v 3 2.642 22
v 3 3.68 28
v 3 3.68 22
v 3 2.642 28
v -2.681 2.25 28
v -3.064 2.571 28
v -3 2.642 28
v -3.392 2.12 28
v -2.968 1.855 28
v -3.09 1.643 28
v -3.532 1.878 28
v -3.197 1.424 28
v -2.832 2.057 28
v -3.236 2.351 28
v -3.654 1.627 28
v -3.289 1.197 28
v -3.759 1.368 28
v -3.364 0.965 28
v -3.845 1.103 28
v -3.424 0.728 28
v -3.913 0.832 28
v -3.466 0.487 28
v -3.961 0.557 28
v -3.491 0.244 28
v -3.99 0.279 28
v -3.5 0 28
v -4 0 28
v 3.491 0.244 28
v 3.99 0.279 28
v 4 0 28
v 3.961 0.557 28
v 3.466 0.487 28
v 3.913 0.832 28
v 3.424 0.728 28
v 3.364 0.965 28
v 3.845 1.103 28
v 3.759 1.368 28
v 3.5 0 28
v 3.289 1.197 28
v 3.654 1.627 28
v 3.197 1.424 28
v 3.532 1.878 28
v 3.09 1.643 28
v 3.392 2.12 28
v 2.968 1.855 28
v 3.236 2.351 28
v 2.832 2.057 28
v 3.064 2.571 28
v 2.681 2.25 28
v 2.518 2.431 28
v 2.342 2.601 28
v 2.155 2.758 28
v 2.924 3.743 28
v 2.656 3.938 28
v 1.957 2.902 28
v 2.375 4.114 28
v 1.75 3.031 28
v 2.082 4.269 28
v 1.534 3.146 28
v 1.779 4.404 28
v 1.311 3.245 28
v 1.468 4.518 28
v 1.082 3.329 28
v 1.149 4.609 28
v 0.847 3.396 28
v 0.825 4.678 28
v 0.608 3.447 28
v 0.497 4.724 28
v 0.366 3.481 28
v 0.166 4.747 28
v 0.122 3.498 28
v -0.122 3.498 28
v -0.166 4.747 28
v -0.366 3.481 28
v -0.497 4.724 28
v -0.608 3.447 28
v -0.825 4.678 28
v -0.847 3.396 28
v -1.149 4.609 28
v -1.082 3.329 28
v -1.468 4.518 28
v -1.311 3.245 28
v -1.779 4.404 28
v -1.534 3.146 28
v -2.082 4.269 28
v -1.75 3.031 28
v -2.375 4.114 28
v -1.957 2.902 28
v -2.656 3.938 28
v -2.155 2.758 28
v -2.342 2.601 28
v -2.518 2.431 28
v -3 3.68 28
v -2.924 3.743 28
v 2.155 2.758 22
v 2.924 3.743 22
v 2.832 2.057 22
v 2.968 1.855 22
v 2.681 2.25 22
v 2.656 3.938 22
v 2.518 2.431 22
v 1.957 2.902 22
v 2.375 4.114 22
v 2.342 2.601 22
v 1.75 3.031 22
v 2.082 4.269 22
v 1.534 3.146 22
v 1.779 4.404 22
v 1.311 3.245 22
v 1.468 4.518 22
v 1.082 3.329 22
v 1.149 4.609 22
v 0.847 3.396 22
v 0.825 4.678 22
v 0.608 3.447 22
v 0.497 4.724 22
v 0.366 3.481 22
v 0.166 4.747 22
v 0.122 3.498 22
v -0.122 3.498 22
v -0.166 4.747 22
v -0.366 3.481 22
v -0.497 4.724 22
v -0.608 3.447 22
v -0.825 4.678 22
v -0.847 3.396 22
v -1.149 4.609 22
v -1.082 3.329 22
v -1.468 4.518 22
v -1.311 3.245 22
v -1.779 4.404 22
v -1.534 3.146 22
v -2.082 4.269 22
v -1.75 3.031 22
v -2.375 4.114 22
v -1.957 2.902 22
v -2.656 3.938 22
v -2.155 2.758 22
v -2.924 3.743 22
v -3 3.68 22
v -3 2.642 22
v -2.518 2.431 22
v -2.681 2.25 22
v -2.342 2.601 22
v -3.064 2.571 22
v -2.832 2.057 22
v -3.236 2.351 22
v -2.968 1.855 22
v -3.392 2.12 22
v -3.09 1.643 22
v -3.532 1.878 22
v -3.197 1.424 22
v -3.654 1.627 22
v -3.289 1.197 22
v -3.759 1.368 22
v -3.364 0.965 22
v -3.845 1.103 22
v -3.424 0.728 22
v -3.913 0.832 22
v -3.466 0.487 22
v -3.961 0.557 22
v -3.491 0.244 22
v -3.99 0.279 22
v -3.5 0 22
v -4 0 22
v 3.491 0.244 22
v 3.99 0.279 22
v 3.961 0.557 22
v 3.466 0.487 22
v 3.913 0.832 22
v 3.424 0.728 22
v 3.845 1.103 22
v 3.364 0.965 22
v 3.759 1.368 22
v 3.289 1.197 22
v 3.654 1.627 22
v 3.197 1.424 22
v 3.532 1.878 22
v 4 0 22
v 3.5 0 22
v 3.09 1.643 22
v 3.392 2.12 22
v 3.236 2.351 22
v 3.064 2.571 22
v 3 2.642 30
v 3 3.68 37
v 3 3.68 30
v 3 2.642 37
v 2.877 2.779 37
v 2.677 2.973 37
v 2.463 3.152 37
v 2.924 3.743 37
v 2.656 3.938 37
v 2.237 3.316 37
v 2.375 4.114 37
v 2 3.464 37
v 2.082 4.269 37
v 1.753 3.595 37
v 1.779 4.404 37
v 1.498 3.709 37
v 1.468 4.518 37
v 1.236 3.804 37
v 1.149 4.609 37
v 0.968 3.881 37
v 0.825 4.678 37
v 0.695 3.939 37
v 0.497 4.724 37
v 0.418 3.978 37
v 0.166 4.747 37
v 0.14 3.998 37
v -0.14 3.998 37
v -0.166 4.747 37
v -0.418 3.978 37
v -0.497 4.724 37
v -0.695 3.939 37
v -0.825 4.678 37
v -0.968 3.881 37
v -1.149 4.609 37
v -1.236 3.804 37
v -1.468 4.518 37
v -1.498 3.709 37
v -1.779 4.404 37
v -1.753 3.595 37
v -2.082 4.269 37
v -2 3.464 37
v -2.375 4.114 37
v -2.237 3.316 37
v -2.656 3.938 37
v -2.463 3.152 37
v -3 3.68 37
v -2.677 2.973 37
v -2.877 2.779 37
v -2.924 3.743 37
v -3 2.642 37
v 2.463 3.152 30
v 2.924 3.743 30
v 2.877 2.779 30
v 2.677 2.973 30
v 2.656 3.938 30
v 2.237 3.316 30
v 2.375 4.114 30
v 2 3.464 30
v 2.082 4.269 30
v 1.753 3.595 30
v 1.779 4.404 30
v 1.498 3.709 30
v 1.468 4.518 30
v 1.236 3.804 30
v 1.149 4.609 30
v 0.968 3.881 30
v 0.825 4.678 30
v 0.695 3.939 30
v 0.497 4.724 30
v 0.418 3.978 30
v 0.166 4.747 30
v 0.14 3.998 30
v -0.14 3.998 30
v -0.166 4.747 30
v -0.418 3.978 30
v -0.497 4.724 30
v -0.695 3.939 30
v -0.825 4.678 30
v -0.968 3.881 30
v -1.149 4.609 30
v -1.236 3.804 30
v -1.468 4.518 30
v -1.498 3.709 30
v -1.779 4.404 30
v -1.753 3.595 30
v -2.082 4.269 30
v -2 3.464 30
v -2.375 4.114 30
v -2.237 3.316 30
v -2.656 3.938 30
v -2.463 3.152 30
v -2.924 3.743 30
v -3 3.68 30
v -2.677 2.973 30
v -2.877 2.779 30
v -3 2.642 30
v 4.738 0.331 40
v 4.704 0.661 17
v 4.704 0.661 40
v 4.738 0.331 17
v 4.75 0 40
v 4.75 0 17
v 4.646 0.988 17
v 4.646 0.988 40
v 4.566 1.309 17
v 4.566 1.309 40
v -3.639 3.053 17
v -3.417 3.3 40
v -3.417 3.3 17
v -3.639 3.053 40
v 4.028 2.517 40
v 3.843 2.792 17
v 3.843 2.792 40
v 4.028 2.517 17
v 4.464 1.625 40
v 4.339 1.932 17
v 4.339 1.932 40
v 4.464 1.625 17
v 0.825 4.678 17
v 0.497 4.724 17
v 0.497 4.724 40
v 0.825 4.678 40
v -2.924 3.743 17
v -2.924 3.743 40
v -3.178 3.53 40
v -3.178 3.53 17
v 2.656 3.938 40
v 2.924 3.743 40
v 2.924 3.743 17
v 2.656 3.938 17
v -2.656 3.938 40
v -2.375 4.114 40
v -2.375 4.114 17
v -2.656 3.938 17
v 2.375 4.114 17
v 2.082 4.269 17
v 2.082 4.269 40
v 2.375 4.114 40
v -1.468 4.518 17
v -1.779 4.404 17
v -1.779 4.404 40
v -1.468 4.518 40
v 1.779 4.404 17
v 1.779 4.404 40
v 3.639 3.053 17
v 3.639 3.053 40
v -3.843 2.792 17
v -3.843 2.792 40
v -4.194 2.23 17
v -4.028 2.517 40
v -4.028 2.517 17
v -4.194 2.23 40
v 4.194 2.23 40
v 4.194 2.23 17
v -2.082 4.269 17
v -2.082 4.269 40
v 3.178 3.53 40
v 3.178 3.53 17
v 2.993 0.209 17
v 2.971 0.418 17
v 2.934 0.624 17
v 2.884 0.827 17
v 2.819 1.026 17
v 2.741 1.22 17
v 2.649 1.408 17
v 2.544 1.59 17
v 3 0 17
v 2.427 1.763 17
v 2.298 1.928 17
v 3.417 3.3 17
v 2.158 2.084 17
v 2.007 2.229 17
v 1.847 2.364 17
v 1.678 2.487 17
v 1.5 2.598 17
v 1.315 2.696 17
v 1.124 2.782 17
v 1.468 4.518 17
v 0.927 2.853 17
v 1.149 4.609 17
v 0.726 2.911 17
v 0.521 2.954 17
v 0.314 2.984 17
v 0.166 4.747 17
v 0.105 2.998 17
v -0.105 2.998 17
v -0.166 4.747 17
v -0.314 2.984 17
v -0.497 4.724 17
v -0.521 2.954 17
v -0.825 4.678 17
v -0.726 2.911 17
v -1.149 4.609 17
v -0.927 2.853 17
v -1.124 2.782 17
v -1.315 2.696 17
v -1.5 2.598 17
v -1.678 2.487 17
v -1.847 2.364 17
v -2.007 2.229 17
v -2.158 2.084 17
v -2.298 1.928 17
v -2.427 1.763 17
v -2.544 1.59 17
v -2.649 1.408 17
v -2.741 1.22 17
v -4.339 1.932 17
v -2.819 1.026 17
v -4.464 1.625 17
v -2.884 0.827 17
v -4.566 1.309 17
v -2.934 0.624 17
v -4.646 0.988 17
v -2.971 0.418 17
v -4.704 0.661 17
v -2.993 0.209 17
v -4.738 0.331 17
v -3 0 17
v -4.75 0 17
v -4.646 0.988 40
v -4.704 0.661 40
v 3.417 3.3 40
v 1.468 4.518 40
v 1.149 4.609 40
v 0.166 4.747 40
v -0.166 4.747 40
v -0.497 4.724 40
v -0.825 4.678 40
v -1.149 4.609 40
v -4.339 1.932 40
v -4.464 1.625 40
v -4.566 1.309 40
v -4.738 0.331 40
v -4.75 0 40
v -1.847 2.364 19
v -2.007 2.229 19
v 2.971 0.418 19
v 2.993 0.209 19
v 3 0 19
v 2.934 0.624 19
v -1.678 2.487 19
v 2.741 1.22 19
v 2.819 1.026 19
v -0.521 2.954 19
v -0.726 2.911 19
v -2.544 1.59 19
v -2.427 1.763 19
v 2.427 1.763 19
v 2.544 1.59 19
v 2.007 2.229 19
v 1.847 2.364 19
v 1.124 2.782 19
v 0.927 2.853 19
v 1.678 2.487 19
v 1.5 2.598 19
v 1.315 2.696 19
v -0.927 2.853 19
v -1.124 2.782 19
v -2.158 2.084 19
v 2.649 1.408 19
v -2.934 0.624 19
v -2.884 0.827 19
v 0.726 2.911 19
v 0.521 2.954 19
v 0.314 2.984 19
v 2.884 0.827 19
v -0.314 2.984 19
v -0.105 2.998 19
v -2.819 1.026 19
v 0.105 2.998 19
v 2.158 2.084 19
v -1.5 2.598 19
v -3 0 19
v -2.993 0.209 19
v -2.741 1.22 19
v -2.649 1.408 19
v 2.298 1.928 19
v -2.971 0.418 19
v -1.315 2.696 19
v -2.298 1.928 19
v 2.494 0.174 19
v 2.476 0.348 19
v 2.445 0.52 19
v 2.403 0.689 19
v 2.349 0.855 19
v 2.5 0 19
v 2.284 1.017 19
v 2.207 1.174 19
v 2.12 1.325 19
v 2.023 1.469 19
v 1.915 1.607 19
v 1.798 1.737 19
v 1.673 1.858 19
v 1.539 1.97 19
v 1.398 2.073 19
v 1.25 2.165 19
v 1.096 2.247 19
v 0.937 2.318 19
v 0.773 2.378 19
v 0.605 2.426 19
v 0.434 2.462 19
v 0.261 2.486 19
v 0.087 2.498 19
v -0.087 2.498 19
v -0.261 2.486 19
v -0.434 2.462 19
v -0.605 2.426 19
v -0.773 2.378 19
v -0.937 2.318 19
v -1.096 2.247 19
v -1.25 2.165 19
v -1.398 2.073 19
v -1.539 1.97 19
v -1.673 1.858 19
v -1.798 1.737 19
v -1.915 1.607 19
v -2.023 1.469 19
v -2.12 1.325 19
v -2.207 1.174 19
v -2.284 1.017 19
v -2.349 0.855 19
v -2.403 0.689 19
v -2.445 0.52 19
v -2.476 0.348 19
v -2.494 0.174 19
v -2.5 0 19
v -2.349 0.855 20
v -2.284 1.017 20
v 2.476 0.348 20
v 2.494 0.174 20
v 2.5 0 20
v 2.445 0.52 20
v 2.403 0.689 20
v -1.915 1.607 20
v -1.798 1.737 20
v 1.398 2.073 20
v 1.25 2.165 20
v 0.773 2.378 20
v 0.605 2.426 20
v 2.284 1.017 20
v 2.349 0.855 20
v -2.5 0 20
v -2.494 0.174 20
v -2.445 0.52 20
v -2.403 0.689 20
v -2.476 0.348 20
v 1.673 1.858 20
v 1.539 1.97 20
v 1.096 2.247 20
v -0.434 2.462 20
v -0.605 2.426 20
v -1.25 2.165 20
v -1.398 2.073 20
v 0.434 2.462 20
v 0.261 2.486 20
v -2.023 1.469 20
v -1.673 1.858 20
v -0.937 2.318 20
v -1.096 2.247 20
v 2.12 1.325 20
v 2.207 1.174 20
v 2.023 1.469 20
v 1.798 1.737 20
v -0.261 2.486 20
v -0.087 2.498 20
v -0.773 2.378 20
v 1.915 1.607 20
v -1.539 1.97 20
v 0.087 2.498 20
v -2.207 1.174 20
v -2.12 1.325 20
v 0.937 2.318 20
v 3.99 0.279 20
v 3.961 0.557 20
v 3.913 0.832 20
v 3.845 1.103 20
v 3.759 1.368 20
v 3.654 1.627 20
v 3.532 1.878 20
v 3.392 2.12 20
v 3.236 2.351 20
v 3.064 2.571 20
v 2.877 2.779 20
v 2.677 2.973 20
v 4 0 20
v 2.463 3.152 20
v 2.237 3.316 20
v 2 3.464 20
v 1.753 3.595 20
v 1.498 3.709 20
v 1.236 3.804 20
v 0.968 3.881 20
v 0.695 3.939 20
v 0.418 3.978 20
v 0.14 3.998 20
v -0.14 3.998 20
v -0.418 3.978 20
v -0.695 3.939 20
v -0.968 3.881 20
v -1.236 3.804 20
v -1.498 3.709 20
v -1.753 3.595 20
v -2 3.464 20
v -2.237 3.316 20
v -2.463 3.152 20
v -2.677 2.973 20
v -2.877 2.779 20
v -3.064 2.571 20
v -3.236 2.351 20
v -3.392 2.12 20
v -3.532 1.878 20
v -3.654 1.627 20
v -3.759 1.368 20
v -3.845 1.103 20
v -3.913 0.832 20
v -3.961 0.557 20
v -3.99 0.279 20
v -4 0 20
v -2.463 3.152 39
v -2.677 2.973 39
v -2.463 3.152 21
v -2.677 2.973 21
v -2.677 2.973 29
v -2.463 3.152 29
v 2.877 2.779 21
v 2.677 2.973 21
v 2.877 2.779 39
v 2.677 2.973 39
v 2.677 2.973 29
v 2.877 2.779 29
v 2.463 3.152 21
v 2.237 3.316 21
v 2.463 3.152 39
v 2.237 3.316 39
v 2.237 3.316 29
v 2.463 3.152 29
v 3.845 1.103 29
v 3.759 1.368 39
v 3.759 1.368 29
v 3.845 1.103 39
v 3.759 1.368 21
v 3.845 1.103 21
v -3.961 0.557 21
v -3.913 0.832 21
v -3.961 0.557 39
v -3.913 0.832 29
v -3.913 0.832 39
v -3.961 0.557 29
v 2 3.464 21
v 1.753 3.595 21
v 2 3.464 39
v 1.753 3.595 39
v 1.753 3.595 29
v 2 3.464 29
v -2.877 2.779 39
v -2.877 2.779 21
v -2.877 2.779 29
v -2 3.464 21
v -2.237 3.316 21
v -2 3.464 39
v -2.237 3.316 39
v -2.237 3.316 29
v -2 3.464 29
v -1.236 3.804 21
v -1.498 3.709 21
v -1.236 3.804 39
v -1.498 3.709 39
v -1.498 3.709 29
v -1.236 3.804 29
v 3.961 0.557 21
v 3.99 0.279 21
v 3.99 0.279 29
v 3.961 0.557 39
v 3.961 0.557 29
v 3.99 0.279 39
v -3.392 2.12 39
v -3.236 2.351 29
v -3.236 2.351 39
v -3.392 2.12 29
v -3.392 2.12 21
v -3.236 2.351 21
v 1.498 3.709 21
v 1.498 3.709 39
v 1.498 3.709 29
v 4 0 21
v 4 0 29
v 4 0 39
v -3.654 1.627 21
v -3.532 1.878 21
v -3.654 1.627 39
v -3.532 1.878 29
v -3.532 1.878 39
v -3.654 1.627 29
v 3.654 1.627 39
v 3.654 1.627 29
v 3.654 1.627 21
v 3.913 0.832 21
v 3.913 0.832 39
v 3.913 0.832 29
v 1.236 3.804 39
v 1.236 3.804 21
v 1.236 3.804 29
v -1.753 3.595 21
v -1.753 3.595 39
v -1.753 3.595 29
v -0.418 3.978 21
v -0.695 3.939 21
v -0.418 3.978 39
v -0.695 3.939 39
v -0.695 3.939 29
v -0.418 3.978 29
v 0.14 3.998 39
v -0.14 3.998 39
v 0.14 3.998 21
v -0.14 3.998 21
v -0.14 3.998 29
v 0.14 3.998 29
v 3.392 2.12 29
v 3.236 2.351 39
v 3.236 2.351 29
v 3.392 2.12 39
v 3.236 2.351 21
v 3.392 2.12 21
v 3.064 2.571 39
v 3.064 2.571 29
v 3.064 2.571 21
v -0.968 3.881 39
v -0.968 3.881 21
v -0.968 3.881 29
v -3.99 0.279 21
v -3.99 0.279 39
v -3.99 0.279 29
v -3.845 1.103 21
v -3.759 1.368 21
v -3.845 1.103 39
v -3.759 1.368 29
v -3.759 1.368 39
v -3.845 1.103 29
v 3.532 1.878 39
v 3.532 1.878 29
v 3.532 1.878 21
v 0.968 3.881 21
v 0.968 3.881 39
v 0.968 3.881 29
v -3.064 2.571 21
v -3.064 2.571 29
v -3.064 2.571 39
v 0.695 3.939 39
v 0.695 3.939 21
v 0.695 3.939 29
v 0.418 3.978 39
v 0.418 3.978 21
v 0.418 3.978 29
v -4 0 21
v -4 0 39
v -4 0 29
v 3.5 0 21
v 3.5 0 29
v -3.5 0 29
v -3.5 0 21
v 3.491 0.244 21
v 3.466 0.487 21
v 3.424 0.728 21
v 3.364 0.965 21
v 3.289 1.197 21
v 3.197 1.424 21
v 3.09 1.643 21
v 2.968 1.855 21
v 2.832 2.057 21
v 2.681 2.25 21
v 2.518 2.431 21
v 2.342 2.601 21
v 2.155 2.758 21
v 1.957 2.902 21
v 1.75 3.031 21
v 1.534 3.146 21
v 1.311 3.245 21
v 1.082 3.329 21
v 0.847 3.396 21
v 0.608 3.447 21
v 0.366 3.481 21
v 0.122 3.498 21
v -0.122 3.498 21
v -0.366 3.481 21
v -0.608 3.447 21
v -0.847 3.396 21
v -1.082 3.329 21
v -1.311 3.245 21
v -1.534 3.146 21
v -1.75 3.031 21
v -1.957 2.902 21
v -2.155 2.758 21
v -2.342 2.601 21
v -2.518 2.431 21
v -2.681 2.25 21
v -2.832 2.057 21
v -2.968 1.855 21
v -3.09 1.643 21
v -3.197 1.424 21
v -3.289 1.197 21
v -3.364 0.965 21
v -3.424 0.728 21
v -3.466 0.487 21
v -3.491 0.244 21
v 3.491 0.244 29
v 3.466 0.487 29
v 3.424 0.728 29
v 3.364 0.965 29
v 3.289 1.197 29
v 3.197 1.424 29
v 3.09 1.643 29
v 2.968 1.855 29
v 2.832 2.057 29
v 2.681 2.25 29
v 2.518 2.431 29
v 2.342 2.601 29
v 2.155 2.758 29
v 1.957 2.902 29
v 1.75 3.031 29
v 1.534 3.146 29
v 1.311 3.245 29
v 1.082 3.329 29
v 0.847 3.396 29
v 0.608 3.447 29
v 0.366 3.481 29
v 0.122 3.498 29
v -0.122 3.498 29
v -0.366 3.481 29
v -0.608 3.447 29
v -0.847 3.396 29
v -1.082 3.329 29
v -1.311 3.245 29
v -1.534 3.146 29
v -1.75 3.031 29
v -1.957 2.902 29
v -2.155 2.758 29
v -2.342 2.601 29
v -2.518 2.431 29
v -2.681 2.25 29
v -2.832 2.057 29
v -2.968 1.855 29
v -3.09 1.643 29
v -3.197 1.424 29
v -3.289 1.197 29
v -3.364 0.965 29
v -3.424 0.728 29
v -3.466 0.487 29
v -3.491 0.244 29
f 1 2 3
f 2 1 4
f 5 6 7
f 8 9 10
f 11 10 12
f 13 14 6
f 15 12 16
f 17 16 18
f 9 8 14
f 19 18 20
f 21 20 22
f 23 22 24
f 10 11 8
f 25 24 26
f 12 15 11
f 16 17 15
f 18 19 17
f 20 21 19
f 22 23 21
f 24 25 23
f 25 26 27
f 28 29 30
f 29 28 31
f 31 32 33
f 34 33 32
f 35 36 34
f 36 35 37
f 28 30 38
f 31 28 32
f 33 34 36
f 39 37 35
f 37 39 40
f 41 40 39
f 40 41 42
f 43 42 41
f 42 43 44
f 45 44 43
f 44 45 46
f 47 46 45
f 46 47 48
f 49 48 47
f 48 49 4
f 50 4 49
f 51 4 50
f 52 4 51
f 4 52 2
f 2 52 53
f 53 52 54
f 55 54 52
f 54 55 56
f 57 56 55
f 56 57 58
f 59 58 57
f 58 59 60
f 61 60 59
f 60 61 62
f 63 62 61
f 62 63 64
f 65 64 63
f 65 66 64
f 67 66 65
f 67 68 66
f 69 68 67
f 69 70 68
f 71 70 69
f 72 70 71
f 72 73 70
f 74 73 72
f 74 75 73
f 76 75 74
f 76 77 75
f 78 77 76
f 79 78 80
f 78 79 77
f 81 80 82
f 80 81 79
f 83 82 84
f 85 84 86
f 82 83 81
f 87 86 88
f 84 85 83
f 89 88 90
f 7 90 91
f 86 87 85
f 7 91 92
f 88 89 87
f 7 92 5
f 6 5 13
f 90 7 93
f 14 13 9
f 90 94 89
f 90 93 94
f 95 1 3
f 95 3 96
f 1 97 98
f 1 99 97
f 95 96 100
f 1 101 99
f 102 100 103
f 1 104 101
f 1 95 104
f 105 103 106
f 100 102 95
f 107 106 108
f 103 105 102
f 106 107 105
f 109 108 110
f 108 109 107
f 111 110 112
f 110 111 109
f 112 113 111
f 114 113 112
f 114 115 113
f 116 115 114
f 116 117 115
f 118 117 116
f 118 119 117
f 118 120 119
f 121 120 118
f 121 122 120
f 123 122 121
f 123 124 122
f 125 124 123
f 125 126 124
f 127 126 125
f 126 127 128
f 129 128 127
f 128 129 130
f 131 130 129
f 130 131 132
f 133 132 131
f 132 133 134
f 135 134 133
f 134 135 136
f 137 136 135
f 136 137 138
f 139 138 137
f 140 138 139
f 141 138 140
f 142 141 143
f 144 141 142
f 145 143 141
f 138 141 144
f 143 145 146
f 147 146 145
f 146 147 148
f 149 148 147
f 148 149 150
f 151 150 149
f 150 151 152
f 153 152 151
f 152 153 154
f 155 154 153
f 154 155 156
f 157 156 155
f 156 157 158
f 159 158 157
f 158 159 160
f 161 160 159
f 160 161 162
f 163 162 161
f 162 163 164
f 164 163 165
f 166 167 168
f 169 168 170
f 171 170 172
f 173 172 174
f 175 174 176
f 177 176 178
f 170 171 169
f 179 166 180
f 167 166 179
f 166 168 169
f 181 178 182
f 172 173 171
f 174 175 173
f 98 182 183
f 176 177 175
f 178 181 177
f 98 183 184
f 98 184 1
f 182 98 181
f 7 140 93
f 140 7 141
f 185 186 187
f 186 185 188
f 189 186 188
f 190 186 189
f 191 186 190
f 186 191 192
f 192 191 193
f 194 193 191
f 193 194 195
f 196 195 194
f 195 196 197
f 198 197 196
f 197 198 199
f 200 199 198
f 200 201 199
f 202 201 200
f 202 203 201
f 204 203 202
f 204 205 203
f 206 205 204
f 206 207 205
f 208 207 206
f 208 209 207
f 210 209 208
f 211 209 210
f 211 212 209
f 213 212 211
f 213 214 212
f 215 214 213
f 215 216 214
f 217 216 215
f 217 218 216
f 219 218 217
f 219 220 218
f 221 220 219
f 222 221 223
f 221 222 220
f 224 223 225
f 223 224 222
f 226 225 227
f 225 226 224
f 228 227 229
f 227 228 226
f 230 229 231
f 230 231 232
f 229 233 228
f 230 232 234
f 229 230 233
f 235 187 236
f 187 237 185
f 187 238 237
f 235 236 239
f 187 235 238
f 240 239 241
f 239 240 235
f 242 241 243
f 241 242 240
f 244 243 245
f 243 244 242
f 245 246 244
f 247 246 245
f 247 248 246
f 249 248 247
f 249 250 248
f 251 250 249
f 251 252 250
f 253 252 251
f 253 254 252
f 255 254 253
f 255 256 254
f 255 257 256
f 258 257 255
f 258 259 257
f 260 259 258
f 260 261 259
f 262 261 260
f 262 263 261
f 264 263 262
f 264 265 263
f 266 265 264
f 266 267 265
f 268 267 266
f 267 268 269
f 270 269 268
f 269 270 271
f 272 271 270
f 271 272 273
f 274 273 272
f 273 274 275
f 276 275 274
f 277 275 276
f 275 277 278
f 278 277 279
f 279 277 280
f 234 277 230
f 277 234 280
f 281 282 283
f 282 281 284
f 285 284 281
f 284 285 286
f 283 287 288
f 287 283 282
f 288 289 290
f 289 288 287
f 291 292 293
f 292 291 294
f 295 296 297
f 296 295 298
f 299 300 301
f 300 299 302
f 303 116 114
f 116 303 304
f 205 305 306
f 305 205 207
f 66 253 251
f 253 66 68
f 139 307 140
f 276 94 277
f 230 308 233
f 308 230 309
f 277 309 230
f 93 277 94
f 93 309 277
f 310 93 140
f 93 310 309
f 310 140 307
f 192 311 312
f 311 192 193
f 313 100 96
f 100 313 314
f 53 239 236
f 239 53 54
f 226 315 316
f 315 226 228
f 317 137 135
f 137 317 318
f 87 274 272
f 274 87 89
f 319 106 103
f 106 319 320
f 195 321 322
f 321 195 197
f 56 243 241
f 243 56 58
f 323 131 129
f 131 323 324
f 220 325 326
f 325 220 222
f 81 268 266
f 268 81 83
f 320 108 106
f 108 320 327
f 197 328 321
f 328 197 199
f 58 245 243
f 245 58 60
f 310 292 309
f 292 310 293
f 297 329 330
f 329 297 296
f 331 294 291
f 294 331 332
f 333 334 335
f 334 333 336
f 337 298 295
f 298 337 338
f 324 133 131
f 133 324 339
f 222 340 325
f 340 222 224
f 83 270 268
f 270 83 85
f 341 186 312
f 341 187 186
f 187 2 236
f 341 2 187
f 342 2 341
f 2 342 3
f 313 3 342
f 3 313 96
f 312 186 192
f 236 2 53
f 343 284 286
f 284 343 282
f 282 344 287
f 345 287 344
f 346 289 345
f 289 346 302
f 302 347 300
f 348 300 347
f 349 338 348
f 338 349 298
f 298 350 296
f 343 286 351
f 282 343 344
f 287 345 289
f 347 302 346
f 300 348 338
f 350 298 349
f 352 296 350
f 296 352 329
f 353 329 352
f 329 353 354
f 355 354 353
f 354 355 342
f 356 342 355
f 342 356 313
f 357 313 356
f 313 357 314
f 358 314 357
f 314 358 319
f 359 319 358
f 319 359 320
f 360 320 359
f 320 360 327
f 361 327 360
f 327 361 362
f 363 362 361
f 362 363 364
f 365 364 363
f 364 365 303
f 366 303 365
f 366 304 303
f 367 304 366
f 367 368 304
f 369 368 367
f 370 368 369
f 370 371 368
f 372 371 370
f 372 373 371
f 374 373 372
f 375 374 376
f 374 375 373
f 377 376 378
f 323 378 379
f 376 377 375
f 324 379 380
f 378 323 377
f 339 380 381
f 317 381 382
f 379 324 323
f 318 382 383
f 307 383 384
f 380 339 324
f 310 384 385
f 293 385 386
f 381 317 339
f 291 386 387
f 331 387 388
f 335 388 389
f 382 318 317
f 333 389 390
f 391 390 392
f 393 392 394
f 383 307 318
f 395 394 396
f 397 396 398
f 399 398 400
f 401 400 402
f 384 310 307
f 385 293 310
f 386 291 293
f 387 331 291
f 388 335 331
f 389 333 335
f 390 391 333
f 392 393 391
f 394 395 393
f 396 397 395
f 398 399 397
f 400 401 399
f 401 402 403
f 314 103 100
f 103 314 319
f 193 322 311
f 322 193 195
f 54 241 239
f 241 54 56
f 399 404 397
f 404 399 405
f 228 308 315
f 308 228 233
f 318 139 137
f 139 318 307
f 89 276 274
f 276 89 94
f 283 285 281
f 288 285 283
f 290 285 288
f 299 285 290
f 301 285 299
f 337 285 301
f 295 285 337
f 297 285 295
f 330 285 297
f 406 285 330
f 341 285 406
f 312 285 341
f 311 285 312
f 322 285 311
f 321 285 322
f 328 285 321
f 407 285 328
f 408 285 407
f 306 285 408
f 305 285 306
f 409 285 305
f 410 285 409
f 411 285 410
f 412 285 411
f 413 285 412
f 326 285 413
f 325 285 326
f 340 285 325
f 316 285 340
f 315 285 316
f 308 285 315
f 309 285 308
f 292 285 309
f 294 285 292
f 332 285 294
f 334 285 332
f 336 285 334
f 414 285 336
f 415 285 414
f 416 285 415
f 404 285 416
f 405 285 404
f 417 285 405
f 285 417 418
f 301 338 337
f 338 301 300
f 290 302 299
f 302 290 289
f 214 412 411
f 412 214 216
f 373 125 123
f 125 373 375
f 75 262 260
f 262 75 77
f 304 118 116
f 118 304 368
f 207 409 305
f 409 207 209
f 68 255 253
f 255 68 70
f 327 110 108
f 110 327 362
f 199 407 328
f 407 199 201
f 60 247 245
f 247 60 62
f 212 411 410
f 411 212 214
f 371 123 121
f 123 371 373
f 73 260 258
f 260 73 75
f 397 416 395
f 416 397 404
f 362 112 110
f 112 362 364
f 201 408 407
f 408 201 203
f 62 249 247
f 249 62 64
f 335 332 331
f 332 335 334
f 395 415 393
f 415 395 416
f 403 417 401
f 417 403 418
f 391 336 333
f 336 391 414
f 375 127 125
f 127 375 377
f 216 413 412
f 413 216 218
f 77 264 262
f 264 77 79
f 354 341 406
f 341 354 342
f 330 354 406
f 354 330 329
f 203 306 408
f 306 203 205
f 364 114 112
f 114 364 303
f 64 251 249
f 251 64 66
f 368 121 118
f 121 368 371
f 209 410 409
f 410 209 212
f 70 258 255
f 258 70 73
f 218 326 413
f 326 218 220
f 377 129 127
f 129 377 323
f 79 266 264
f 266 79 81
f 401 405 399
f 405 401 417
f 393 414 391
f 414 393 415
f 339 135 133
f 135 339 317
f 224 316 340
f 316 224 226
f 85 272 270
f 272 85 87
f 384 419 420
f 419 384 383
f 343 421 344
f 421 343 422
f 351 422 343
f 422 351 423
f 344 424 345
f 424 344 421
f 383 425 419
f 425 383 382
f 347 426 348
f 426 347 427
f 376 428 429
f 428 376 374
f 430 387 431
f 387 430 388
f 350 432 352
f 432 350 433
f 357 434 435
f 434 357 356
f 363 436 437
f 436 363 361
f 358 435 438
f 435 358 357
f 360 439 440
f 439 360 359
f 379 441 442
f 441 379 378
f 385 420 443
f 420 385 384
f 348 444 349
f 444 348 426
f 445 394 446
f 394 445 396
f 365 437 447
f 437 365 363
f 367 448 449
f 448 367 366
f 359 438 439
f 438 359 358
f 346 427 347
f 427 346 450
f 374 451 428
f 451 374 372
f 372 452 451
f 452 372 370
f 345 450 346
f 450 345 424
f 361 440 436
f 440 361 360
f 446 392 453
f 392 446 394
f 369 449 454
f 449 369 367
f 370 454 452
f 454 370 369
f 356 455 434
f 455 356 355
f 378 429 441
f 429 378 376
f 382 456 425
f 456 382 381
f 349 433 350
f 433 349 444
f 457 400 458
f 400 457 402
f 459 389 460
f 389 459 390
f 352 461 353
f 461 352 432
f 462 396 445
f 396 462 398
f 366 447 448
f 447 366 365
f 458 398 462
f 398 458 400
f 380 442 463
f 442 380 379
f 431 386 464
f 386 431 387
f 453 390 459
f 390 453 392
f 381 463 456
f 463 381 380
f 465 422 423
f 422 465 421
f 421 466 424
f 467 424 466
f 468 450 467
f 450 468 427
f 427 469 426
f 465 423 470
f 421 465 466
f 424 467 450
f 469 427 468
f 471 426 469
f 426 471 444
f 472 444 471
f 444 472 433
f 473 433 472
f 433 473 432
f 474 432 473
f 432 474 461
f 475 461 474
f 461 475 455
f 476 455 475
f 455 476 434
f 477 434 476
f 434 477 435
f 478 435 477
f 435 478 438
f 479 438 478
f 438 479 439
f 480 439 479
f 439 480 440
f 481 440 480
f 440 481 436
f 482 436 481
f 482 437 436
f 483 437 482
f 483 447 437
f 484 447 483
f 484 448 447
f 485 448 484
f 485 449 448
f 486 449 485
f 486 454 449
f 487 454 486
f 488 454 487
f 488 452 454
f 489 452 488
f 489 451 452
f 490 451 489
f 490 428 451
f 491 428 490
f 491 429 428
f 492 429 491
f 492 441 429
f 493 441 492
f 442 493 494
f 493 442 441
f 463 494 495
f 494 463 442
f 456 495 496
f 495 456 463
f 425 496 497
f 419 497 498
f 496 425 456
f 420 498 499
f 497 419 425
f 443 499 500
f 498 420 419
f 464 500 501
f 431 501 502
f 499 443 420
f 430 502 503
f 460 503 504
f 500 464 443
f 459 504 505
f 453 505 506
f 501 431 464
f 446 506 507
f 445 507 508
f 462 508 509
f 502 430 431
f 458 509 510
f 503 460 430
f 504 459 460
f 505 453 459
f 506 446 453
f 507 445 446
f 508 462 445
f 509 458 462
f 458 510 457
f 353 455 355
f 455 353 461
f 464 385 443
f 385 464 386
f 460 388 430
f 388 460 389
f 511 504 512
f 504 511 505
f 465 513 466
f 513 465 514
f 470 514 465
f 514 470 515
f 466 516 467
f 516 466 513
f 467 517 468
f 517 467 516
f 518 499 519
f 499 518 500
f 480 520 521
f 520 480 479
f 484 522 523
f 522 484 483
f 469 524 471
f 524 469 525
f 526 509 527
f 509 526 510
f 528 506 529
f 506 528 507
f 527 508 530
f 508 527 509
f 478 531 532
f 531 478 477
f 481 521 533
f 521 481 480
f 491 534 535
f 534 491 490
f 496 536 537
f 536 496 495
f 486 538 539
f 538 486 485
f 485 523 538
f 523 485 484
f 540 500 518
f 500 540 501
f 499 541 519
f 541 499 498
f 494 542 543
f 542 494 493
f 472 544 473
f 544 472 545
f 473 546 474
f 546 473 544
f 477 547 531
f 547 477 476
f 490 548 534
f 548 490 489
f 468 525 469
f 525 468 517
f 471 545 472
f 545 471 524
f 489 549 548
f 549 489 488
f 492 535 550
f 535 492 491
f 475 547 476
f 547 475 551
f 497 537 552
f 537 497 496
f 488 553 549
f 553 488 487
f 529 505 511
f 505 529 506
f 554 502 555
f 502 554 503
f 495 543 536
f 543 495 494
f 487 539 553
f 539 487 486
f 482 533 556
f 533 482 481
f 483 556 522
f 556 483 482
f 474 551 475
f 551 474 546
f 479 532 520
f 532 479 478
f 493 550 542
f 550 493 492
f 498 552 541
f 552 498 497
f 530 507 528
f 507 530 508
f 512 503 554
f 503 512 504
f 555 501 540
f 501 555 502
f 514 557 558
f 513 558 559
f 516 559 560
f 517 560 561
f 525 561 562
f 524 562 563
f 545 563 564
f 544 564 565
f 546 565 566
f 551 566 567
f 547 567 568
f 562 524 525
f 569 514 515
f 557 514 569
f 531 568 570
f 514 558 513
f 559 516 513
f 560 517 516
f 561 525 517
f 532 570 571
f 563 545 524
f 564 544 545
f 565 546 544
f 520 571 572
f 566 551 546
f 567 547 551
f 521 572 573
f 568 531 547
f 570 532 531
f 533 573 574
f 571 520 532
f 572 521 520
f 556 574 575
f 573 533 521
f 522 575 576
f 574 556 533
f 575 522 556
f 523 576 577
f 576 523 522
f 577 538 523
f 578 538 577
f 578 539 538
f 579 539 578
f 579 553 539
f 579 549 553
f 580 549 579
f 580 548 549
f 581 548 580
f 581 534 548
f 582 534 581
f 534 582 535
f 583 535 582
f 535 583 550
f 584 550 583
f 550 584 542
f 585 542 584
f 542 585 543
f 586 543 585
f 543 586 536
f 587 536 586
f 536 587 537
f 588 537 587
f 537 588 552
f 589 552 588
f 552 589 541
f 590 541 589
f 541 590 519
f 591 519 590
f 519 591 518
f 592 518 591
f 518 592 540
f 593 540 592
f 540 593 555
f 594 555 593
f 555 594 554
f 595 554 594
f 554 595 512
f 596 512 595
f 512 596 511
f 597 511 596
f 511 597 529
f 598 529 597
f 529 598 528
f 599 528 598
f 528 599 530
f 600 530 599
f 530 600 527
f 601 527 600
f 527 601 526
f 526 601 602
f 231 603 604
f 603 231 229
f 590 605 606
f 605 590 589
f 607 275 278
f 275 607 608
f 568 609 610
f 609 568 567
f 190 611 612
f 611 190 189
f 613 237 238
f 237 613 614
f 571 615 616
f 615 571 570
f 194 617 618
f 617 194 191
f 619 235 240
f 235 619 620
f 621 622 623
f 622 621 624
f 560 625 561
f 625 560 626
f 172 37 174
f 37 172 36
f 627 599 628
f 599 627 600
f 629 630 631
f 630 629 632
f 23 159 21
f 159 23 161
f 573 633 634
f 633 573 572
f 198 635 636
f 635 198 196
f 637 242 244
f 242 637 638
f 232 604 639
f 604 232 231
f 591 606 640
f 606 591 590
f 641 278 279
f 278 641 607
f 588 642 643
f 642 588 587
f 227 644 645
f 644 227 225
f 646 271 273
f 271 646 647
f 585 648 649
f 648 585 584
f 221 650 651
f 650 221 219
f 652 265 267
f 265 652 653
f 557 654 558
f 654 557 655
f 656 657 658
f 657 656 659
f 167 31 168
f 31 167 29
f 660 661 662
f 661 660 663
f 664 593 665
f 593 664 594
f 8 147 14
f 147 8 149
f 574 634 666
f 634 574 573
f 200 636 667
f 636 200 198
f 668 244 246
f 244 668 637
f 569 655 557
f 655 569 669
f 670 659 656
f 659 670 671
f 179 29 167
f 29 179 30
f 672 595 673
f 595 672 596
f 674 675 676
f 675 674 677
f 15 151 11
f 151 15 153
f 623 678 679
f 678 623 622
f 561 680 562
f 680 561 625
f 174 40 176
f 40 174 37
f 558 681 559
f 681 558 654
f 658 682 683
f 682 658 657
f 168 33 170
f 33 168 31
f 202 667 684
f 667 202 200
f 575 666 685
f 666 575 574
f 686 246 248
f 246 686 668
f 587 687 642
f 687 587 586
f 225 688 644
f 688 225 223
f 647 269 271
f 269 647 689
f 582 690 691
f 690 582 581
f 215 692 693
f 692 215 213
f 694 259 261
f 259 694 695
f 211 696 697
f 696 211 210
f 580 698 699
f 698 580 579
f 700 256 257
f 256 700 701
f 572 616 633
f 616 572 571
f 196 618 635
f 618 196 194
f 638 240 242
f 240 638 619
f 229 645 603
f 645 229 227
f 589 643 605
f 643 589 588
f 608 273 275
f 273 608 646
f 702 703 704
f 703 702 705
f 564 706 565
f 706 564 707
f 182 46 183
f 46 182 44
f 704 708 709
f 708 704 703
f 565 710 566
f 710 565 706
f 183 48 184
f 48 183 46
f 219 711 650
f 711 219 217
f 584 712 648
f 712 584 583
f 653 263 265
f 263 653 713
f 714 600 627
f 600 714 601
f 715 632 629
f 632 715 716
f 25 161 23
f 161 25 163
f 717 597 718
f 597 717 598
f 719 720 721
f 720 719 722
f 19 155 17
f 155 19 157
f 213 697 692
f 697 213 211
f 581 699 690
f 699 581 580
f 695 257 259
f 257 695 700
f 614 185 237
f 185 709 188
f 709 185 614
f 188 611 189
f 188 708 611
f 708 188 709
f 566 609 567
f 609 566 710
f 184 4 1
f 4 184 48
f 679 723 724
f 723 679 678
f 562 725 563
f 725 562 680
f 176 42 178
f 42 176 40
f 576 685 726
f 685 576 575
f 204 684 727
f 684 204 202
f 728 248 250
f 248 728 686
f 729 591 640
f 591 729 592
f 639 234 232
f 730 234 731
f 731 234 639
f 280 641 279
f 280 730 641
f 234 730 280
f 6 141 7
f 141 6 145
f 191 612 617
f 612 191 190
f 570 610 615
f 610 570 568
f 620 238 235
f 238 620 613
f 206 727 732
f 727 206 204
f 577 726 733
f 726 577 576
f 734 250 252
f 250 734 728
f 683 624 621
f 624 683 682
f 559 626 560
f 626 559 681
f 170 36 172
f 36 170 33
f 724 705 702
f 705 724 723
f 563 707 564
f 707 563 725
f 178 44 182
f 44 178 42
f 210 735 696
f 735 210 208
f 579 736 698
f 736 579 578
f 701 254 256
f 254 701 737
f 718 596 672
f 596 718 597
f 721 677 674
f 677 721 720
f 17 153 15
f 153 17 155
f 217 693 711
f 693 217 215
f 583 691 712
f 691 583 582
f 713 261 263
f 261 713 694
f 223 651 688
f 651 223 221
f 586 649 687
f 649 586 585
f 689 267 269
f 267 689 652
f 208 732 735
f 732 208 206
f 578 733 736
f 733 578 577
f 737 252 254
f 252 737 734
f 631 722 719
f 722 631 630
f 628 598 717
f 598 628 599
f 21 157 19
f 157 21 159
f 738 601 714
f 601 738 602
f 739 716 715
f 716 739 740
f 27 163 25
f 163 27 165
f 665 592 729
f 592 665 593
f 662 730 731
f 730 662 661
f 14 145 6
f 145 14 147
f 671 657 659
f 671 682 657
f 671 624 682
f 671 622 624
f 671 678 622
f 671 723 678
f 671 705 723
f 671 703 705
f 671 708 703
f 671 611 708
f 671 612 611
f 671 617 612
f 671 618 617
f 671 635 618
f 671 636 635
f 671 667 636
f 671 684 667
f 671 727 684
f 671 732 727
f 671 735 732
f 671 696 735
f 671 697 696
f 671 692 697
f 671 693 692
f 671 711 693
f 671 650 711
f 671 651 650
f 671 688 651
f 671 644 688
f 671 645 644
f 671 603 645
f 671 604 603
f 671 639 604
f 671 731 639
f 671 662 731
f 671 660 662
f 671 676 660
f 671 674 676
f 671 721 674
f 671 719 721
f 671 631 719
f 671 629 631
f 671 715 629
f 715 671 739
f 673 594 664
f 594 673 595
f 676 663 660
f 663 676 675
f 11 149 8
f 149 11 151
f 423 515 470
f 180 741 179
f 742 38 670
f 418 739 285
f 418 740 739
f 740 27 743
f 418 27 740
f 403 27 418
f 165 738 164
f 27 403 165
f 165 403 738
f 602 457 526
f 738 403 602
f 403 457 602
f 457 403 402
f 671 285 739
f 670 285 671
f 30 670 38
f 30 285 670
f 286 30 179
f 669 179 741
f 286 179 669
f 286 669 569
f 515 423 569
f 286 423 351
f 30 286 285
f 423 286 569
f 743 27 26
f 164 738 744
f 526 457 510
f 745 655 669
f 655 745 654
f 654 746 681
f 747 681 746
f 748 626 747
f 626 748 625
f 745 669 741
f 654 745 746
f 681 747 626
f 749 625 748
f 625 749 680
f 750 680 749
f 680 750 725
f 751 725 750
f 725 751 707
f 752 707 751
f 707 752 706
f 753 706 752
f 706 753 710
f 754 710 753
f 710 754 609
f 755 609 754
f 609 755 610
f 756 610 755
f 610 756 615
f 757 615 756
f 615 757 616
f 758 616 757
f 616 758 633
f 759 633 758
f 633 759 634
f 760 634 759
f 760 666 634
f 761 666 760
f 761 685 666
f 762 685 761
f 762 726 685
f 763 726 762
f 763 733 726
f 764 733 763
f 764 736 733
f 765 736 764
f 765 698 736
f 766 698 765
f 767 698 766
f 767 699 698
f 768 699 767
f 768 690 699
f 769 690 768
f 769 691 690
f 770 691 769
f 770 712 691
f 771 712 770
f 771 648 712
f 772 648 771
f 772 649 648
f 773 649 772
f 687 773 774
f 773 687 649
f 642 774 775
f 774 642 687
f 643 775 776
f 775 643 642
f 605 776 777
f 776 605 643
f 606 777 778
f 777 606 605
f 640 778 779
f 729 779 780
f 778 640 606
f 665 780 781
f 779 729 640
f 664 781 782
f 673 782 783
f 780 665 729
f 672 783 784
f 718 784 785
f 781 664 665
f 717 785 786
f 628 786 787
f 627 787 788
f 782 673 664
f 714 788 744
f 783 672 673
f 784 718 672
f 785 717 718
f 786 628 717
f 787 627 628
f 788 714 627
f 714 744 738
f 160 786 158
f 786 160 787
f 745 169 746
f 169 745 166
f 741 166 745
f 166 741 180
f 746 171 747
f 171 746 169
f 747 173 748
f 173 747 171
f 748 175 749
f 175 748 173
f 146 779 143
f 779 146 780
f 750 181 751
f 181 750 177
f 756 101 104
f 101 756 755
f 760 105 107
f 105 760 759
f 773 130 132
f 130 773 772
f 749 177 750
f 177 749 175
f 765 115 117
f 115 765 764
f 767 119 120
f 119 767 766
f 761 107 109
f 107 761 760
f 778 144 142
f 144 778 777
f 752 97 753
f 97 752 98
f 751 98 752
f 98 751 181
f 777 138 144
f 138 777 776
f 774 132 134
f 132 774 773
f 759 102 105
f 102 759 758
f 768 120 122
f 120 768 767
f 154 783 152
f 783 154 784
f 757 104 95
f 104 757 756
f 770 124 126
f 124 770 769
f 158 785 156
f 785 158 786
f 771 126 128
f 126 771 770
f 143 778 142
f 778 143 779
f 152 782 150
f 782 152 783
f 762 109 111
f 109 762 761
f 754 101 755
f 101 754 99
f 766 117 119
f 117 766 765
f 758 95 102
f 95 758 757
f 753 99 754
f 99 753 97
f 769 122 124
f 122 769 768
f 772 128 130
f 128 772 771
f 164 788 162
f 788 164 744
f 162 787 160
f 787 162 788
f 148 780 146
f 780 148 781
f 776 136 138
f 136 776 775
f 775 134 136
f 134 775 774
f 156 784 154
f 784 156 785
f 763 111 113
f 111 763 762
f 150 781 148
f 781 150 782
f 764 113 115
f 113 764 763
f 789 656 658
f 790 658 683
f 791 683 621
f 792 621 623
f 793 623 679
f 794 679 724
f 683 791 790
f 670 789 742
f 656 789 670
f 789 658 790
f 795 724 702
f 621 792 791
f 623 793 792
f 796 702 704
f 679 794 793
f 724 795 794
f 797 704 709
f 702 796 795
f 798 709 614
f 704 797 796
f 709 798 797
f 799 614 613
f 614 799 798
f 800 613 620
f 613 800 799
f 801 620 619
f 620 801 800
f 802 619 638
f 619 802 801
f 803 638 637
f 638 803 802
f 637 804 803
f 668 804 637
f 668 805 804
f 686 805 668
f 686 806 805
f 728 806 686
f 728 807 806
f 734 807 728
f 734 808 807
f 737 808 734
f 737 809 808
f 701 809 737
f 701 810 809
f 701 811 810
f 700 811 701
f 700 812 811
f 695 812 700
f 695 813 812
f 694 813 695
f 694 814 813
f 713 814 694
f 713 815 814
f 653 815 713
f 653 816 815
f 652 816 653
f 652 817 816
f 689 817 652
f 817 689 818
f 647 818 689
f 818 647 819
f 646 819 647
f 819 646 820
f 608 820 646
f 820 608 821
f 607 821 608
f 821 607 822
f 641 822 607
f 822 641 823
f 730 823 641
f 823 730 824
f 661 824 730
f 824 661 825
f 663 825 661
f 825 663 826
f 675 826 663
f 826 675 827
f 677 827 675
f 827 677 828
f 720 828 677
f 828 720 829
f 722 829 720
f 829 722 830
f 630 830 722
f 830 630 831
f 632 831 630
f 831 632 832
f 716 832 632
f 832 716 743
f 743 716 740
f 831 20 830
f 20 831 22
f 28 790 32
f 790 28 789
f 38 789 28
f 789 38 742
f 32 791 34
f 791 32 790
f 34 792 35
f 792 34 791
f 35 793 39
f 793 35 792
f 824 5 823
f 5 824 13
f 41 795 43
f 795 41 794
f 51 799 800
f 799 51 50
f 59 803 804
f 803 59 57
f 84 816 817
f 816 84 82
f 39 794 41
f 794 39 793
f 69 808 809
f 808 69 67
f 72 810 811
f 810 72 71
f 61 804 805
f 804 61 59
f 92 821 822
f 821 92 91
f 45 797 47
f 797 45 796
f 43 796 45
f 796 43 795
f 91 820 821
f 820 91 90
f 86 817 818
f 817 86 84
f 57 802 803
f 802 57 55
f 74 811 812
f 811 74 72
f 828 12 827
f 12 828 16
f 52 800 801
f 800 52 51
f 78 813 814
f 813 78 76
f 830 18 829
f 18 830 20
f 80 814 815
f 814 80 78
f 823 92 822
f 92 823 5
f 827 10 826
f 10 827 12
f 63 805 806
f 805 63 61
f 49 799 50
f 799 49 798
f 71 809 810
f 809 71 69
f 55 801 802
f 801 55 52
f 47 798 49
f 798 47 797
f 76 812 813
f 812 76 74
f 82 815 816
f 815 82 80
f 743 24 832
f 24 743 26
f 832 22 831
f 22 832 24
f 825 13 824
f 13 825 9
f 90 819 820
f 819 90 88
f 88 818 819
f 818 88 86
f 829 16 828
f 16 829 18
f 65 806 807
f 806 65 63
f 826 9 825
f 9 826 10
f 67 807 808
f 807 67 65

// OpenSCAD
$fn = 90;

DRAW_BOTTOM =  false;
DRAW_TOP = true;
CUTOUT = true;

CASE_D = 9.5;
BATTERY_D = 8.0;
BATTERY_Z = 4.0;
CASE_Z = 40.0;

PASS_0_Z = 22;
PASS_0_DZ = 6;
PASS_0_DX = 6;
PASS_1_Z = 30;
PASS_1_DZ = 7;
PASS_1_DX = 6;

SWITCH_RING_0_Z = 21;
SWITCH_RING_1_Z = 28;
SWITCH_RING_D = 7;

TOP_SPRING_Z = 2.0;

SPRING_Z = 2.0;
SPRING_D = 6.0;
FLOOR_Z  = 1.0;
FLOOR_D  = 5.0;
LED_LIFT_Z = 2.0;

LOWER_Z = LED_LIFT_Z + FLOOR_Z + SPRING_Z + BATTERY_Z * 3;

if (DRAW_BOTTOM) {
    difference() {
        cylinder(h=LOWER_Z, d=CASE_D);

        cylinder(h=LED_LIFT_Z, d=BATTERY_D);
        translate([0, 0, LED_LIFT_Z]) 
            cylinder(h=FLOOR_Z, d=FLOOR_D);
        translate([0, 0, LED_LIFT_Z + FLOOR_Z]) 
            cylinder(h=SPRING_Z, d=SPRING_D);
        translate([0, 0, LED_LIFT_Z + FLOOR_Z + SPRING_Z]) 
            cylinder(h=BATTERY_Z * 3, d=BATTERY_D);

        if (CUTOUT) translate([-20, -20, 0]) cube(size=[40, 20, 100]);
    }
}


if (DRAW_TOP) {
    translate([0, 0, LOWER_Z]) difference() {
        cylinder(h=CASE_Z - LOWER_Z, d=CASE_D);

        cylinder(h=TOP_SPRING_Z, d=SPRING_D);
        translate([0, 0, TOP_SPRING_Z]) 
            cylinder(h=FLOOR_Z, d=FLOOR_D);
        translate([0, 0, TOP_SPRING_Z + FLOOR_Z])
            cylinder(h=CASE_Z - LOWER_Z - TOP_SPRING_Z - FLOOR_Z - FLOOR_Z, d=BATTERY_D);

        translate([0, 0, -LOWER_Z]) {
            translate([-PASS_0_DX/2, -20, PASS_0_Z]) 
                cube(size=[PASS_0_DX, 40, PASS_0_DZ]);
            translate([-PASS_1_DX/2, -20, PASS_1_Z]) 
                cube(size=[PASS_1_DX, 40, PASS_1_DZ]);
        }
        if (CUTOUT) translate([-20, -20, 0]) cube(size=[40, 20, 100]);
    }
    translate([0, 0, SWITCH_RING_0_Z]) {
        difference() {
            cylinder(h=FLOOR_Z, d=CASE_D);
            cylinder(h=FLOOR_Z, d=SWITCH_RING_D);
            if (CUTOUT) translate([-20, -20, 0]) cube(size=[40, 20, 100]);
       }
    }
    translate([0, 0, SWITCH_RING_1_Z]) {
        difference() {
            cylinder(h=FLOOR_Z, d=CASE_D);
            cylinder(h=FLOOR_Z, d=SWITCH_RING_D);
            if (CUTOUT) translate([-20, -20, 0]) cube(size=[40, 20, 100]);
        }
    }
}


 
